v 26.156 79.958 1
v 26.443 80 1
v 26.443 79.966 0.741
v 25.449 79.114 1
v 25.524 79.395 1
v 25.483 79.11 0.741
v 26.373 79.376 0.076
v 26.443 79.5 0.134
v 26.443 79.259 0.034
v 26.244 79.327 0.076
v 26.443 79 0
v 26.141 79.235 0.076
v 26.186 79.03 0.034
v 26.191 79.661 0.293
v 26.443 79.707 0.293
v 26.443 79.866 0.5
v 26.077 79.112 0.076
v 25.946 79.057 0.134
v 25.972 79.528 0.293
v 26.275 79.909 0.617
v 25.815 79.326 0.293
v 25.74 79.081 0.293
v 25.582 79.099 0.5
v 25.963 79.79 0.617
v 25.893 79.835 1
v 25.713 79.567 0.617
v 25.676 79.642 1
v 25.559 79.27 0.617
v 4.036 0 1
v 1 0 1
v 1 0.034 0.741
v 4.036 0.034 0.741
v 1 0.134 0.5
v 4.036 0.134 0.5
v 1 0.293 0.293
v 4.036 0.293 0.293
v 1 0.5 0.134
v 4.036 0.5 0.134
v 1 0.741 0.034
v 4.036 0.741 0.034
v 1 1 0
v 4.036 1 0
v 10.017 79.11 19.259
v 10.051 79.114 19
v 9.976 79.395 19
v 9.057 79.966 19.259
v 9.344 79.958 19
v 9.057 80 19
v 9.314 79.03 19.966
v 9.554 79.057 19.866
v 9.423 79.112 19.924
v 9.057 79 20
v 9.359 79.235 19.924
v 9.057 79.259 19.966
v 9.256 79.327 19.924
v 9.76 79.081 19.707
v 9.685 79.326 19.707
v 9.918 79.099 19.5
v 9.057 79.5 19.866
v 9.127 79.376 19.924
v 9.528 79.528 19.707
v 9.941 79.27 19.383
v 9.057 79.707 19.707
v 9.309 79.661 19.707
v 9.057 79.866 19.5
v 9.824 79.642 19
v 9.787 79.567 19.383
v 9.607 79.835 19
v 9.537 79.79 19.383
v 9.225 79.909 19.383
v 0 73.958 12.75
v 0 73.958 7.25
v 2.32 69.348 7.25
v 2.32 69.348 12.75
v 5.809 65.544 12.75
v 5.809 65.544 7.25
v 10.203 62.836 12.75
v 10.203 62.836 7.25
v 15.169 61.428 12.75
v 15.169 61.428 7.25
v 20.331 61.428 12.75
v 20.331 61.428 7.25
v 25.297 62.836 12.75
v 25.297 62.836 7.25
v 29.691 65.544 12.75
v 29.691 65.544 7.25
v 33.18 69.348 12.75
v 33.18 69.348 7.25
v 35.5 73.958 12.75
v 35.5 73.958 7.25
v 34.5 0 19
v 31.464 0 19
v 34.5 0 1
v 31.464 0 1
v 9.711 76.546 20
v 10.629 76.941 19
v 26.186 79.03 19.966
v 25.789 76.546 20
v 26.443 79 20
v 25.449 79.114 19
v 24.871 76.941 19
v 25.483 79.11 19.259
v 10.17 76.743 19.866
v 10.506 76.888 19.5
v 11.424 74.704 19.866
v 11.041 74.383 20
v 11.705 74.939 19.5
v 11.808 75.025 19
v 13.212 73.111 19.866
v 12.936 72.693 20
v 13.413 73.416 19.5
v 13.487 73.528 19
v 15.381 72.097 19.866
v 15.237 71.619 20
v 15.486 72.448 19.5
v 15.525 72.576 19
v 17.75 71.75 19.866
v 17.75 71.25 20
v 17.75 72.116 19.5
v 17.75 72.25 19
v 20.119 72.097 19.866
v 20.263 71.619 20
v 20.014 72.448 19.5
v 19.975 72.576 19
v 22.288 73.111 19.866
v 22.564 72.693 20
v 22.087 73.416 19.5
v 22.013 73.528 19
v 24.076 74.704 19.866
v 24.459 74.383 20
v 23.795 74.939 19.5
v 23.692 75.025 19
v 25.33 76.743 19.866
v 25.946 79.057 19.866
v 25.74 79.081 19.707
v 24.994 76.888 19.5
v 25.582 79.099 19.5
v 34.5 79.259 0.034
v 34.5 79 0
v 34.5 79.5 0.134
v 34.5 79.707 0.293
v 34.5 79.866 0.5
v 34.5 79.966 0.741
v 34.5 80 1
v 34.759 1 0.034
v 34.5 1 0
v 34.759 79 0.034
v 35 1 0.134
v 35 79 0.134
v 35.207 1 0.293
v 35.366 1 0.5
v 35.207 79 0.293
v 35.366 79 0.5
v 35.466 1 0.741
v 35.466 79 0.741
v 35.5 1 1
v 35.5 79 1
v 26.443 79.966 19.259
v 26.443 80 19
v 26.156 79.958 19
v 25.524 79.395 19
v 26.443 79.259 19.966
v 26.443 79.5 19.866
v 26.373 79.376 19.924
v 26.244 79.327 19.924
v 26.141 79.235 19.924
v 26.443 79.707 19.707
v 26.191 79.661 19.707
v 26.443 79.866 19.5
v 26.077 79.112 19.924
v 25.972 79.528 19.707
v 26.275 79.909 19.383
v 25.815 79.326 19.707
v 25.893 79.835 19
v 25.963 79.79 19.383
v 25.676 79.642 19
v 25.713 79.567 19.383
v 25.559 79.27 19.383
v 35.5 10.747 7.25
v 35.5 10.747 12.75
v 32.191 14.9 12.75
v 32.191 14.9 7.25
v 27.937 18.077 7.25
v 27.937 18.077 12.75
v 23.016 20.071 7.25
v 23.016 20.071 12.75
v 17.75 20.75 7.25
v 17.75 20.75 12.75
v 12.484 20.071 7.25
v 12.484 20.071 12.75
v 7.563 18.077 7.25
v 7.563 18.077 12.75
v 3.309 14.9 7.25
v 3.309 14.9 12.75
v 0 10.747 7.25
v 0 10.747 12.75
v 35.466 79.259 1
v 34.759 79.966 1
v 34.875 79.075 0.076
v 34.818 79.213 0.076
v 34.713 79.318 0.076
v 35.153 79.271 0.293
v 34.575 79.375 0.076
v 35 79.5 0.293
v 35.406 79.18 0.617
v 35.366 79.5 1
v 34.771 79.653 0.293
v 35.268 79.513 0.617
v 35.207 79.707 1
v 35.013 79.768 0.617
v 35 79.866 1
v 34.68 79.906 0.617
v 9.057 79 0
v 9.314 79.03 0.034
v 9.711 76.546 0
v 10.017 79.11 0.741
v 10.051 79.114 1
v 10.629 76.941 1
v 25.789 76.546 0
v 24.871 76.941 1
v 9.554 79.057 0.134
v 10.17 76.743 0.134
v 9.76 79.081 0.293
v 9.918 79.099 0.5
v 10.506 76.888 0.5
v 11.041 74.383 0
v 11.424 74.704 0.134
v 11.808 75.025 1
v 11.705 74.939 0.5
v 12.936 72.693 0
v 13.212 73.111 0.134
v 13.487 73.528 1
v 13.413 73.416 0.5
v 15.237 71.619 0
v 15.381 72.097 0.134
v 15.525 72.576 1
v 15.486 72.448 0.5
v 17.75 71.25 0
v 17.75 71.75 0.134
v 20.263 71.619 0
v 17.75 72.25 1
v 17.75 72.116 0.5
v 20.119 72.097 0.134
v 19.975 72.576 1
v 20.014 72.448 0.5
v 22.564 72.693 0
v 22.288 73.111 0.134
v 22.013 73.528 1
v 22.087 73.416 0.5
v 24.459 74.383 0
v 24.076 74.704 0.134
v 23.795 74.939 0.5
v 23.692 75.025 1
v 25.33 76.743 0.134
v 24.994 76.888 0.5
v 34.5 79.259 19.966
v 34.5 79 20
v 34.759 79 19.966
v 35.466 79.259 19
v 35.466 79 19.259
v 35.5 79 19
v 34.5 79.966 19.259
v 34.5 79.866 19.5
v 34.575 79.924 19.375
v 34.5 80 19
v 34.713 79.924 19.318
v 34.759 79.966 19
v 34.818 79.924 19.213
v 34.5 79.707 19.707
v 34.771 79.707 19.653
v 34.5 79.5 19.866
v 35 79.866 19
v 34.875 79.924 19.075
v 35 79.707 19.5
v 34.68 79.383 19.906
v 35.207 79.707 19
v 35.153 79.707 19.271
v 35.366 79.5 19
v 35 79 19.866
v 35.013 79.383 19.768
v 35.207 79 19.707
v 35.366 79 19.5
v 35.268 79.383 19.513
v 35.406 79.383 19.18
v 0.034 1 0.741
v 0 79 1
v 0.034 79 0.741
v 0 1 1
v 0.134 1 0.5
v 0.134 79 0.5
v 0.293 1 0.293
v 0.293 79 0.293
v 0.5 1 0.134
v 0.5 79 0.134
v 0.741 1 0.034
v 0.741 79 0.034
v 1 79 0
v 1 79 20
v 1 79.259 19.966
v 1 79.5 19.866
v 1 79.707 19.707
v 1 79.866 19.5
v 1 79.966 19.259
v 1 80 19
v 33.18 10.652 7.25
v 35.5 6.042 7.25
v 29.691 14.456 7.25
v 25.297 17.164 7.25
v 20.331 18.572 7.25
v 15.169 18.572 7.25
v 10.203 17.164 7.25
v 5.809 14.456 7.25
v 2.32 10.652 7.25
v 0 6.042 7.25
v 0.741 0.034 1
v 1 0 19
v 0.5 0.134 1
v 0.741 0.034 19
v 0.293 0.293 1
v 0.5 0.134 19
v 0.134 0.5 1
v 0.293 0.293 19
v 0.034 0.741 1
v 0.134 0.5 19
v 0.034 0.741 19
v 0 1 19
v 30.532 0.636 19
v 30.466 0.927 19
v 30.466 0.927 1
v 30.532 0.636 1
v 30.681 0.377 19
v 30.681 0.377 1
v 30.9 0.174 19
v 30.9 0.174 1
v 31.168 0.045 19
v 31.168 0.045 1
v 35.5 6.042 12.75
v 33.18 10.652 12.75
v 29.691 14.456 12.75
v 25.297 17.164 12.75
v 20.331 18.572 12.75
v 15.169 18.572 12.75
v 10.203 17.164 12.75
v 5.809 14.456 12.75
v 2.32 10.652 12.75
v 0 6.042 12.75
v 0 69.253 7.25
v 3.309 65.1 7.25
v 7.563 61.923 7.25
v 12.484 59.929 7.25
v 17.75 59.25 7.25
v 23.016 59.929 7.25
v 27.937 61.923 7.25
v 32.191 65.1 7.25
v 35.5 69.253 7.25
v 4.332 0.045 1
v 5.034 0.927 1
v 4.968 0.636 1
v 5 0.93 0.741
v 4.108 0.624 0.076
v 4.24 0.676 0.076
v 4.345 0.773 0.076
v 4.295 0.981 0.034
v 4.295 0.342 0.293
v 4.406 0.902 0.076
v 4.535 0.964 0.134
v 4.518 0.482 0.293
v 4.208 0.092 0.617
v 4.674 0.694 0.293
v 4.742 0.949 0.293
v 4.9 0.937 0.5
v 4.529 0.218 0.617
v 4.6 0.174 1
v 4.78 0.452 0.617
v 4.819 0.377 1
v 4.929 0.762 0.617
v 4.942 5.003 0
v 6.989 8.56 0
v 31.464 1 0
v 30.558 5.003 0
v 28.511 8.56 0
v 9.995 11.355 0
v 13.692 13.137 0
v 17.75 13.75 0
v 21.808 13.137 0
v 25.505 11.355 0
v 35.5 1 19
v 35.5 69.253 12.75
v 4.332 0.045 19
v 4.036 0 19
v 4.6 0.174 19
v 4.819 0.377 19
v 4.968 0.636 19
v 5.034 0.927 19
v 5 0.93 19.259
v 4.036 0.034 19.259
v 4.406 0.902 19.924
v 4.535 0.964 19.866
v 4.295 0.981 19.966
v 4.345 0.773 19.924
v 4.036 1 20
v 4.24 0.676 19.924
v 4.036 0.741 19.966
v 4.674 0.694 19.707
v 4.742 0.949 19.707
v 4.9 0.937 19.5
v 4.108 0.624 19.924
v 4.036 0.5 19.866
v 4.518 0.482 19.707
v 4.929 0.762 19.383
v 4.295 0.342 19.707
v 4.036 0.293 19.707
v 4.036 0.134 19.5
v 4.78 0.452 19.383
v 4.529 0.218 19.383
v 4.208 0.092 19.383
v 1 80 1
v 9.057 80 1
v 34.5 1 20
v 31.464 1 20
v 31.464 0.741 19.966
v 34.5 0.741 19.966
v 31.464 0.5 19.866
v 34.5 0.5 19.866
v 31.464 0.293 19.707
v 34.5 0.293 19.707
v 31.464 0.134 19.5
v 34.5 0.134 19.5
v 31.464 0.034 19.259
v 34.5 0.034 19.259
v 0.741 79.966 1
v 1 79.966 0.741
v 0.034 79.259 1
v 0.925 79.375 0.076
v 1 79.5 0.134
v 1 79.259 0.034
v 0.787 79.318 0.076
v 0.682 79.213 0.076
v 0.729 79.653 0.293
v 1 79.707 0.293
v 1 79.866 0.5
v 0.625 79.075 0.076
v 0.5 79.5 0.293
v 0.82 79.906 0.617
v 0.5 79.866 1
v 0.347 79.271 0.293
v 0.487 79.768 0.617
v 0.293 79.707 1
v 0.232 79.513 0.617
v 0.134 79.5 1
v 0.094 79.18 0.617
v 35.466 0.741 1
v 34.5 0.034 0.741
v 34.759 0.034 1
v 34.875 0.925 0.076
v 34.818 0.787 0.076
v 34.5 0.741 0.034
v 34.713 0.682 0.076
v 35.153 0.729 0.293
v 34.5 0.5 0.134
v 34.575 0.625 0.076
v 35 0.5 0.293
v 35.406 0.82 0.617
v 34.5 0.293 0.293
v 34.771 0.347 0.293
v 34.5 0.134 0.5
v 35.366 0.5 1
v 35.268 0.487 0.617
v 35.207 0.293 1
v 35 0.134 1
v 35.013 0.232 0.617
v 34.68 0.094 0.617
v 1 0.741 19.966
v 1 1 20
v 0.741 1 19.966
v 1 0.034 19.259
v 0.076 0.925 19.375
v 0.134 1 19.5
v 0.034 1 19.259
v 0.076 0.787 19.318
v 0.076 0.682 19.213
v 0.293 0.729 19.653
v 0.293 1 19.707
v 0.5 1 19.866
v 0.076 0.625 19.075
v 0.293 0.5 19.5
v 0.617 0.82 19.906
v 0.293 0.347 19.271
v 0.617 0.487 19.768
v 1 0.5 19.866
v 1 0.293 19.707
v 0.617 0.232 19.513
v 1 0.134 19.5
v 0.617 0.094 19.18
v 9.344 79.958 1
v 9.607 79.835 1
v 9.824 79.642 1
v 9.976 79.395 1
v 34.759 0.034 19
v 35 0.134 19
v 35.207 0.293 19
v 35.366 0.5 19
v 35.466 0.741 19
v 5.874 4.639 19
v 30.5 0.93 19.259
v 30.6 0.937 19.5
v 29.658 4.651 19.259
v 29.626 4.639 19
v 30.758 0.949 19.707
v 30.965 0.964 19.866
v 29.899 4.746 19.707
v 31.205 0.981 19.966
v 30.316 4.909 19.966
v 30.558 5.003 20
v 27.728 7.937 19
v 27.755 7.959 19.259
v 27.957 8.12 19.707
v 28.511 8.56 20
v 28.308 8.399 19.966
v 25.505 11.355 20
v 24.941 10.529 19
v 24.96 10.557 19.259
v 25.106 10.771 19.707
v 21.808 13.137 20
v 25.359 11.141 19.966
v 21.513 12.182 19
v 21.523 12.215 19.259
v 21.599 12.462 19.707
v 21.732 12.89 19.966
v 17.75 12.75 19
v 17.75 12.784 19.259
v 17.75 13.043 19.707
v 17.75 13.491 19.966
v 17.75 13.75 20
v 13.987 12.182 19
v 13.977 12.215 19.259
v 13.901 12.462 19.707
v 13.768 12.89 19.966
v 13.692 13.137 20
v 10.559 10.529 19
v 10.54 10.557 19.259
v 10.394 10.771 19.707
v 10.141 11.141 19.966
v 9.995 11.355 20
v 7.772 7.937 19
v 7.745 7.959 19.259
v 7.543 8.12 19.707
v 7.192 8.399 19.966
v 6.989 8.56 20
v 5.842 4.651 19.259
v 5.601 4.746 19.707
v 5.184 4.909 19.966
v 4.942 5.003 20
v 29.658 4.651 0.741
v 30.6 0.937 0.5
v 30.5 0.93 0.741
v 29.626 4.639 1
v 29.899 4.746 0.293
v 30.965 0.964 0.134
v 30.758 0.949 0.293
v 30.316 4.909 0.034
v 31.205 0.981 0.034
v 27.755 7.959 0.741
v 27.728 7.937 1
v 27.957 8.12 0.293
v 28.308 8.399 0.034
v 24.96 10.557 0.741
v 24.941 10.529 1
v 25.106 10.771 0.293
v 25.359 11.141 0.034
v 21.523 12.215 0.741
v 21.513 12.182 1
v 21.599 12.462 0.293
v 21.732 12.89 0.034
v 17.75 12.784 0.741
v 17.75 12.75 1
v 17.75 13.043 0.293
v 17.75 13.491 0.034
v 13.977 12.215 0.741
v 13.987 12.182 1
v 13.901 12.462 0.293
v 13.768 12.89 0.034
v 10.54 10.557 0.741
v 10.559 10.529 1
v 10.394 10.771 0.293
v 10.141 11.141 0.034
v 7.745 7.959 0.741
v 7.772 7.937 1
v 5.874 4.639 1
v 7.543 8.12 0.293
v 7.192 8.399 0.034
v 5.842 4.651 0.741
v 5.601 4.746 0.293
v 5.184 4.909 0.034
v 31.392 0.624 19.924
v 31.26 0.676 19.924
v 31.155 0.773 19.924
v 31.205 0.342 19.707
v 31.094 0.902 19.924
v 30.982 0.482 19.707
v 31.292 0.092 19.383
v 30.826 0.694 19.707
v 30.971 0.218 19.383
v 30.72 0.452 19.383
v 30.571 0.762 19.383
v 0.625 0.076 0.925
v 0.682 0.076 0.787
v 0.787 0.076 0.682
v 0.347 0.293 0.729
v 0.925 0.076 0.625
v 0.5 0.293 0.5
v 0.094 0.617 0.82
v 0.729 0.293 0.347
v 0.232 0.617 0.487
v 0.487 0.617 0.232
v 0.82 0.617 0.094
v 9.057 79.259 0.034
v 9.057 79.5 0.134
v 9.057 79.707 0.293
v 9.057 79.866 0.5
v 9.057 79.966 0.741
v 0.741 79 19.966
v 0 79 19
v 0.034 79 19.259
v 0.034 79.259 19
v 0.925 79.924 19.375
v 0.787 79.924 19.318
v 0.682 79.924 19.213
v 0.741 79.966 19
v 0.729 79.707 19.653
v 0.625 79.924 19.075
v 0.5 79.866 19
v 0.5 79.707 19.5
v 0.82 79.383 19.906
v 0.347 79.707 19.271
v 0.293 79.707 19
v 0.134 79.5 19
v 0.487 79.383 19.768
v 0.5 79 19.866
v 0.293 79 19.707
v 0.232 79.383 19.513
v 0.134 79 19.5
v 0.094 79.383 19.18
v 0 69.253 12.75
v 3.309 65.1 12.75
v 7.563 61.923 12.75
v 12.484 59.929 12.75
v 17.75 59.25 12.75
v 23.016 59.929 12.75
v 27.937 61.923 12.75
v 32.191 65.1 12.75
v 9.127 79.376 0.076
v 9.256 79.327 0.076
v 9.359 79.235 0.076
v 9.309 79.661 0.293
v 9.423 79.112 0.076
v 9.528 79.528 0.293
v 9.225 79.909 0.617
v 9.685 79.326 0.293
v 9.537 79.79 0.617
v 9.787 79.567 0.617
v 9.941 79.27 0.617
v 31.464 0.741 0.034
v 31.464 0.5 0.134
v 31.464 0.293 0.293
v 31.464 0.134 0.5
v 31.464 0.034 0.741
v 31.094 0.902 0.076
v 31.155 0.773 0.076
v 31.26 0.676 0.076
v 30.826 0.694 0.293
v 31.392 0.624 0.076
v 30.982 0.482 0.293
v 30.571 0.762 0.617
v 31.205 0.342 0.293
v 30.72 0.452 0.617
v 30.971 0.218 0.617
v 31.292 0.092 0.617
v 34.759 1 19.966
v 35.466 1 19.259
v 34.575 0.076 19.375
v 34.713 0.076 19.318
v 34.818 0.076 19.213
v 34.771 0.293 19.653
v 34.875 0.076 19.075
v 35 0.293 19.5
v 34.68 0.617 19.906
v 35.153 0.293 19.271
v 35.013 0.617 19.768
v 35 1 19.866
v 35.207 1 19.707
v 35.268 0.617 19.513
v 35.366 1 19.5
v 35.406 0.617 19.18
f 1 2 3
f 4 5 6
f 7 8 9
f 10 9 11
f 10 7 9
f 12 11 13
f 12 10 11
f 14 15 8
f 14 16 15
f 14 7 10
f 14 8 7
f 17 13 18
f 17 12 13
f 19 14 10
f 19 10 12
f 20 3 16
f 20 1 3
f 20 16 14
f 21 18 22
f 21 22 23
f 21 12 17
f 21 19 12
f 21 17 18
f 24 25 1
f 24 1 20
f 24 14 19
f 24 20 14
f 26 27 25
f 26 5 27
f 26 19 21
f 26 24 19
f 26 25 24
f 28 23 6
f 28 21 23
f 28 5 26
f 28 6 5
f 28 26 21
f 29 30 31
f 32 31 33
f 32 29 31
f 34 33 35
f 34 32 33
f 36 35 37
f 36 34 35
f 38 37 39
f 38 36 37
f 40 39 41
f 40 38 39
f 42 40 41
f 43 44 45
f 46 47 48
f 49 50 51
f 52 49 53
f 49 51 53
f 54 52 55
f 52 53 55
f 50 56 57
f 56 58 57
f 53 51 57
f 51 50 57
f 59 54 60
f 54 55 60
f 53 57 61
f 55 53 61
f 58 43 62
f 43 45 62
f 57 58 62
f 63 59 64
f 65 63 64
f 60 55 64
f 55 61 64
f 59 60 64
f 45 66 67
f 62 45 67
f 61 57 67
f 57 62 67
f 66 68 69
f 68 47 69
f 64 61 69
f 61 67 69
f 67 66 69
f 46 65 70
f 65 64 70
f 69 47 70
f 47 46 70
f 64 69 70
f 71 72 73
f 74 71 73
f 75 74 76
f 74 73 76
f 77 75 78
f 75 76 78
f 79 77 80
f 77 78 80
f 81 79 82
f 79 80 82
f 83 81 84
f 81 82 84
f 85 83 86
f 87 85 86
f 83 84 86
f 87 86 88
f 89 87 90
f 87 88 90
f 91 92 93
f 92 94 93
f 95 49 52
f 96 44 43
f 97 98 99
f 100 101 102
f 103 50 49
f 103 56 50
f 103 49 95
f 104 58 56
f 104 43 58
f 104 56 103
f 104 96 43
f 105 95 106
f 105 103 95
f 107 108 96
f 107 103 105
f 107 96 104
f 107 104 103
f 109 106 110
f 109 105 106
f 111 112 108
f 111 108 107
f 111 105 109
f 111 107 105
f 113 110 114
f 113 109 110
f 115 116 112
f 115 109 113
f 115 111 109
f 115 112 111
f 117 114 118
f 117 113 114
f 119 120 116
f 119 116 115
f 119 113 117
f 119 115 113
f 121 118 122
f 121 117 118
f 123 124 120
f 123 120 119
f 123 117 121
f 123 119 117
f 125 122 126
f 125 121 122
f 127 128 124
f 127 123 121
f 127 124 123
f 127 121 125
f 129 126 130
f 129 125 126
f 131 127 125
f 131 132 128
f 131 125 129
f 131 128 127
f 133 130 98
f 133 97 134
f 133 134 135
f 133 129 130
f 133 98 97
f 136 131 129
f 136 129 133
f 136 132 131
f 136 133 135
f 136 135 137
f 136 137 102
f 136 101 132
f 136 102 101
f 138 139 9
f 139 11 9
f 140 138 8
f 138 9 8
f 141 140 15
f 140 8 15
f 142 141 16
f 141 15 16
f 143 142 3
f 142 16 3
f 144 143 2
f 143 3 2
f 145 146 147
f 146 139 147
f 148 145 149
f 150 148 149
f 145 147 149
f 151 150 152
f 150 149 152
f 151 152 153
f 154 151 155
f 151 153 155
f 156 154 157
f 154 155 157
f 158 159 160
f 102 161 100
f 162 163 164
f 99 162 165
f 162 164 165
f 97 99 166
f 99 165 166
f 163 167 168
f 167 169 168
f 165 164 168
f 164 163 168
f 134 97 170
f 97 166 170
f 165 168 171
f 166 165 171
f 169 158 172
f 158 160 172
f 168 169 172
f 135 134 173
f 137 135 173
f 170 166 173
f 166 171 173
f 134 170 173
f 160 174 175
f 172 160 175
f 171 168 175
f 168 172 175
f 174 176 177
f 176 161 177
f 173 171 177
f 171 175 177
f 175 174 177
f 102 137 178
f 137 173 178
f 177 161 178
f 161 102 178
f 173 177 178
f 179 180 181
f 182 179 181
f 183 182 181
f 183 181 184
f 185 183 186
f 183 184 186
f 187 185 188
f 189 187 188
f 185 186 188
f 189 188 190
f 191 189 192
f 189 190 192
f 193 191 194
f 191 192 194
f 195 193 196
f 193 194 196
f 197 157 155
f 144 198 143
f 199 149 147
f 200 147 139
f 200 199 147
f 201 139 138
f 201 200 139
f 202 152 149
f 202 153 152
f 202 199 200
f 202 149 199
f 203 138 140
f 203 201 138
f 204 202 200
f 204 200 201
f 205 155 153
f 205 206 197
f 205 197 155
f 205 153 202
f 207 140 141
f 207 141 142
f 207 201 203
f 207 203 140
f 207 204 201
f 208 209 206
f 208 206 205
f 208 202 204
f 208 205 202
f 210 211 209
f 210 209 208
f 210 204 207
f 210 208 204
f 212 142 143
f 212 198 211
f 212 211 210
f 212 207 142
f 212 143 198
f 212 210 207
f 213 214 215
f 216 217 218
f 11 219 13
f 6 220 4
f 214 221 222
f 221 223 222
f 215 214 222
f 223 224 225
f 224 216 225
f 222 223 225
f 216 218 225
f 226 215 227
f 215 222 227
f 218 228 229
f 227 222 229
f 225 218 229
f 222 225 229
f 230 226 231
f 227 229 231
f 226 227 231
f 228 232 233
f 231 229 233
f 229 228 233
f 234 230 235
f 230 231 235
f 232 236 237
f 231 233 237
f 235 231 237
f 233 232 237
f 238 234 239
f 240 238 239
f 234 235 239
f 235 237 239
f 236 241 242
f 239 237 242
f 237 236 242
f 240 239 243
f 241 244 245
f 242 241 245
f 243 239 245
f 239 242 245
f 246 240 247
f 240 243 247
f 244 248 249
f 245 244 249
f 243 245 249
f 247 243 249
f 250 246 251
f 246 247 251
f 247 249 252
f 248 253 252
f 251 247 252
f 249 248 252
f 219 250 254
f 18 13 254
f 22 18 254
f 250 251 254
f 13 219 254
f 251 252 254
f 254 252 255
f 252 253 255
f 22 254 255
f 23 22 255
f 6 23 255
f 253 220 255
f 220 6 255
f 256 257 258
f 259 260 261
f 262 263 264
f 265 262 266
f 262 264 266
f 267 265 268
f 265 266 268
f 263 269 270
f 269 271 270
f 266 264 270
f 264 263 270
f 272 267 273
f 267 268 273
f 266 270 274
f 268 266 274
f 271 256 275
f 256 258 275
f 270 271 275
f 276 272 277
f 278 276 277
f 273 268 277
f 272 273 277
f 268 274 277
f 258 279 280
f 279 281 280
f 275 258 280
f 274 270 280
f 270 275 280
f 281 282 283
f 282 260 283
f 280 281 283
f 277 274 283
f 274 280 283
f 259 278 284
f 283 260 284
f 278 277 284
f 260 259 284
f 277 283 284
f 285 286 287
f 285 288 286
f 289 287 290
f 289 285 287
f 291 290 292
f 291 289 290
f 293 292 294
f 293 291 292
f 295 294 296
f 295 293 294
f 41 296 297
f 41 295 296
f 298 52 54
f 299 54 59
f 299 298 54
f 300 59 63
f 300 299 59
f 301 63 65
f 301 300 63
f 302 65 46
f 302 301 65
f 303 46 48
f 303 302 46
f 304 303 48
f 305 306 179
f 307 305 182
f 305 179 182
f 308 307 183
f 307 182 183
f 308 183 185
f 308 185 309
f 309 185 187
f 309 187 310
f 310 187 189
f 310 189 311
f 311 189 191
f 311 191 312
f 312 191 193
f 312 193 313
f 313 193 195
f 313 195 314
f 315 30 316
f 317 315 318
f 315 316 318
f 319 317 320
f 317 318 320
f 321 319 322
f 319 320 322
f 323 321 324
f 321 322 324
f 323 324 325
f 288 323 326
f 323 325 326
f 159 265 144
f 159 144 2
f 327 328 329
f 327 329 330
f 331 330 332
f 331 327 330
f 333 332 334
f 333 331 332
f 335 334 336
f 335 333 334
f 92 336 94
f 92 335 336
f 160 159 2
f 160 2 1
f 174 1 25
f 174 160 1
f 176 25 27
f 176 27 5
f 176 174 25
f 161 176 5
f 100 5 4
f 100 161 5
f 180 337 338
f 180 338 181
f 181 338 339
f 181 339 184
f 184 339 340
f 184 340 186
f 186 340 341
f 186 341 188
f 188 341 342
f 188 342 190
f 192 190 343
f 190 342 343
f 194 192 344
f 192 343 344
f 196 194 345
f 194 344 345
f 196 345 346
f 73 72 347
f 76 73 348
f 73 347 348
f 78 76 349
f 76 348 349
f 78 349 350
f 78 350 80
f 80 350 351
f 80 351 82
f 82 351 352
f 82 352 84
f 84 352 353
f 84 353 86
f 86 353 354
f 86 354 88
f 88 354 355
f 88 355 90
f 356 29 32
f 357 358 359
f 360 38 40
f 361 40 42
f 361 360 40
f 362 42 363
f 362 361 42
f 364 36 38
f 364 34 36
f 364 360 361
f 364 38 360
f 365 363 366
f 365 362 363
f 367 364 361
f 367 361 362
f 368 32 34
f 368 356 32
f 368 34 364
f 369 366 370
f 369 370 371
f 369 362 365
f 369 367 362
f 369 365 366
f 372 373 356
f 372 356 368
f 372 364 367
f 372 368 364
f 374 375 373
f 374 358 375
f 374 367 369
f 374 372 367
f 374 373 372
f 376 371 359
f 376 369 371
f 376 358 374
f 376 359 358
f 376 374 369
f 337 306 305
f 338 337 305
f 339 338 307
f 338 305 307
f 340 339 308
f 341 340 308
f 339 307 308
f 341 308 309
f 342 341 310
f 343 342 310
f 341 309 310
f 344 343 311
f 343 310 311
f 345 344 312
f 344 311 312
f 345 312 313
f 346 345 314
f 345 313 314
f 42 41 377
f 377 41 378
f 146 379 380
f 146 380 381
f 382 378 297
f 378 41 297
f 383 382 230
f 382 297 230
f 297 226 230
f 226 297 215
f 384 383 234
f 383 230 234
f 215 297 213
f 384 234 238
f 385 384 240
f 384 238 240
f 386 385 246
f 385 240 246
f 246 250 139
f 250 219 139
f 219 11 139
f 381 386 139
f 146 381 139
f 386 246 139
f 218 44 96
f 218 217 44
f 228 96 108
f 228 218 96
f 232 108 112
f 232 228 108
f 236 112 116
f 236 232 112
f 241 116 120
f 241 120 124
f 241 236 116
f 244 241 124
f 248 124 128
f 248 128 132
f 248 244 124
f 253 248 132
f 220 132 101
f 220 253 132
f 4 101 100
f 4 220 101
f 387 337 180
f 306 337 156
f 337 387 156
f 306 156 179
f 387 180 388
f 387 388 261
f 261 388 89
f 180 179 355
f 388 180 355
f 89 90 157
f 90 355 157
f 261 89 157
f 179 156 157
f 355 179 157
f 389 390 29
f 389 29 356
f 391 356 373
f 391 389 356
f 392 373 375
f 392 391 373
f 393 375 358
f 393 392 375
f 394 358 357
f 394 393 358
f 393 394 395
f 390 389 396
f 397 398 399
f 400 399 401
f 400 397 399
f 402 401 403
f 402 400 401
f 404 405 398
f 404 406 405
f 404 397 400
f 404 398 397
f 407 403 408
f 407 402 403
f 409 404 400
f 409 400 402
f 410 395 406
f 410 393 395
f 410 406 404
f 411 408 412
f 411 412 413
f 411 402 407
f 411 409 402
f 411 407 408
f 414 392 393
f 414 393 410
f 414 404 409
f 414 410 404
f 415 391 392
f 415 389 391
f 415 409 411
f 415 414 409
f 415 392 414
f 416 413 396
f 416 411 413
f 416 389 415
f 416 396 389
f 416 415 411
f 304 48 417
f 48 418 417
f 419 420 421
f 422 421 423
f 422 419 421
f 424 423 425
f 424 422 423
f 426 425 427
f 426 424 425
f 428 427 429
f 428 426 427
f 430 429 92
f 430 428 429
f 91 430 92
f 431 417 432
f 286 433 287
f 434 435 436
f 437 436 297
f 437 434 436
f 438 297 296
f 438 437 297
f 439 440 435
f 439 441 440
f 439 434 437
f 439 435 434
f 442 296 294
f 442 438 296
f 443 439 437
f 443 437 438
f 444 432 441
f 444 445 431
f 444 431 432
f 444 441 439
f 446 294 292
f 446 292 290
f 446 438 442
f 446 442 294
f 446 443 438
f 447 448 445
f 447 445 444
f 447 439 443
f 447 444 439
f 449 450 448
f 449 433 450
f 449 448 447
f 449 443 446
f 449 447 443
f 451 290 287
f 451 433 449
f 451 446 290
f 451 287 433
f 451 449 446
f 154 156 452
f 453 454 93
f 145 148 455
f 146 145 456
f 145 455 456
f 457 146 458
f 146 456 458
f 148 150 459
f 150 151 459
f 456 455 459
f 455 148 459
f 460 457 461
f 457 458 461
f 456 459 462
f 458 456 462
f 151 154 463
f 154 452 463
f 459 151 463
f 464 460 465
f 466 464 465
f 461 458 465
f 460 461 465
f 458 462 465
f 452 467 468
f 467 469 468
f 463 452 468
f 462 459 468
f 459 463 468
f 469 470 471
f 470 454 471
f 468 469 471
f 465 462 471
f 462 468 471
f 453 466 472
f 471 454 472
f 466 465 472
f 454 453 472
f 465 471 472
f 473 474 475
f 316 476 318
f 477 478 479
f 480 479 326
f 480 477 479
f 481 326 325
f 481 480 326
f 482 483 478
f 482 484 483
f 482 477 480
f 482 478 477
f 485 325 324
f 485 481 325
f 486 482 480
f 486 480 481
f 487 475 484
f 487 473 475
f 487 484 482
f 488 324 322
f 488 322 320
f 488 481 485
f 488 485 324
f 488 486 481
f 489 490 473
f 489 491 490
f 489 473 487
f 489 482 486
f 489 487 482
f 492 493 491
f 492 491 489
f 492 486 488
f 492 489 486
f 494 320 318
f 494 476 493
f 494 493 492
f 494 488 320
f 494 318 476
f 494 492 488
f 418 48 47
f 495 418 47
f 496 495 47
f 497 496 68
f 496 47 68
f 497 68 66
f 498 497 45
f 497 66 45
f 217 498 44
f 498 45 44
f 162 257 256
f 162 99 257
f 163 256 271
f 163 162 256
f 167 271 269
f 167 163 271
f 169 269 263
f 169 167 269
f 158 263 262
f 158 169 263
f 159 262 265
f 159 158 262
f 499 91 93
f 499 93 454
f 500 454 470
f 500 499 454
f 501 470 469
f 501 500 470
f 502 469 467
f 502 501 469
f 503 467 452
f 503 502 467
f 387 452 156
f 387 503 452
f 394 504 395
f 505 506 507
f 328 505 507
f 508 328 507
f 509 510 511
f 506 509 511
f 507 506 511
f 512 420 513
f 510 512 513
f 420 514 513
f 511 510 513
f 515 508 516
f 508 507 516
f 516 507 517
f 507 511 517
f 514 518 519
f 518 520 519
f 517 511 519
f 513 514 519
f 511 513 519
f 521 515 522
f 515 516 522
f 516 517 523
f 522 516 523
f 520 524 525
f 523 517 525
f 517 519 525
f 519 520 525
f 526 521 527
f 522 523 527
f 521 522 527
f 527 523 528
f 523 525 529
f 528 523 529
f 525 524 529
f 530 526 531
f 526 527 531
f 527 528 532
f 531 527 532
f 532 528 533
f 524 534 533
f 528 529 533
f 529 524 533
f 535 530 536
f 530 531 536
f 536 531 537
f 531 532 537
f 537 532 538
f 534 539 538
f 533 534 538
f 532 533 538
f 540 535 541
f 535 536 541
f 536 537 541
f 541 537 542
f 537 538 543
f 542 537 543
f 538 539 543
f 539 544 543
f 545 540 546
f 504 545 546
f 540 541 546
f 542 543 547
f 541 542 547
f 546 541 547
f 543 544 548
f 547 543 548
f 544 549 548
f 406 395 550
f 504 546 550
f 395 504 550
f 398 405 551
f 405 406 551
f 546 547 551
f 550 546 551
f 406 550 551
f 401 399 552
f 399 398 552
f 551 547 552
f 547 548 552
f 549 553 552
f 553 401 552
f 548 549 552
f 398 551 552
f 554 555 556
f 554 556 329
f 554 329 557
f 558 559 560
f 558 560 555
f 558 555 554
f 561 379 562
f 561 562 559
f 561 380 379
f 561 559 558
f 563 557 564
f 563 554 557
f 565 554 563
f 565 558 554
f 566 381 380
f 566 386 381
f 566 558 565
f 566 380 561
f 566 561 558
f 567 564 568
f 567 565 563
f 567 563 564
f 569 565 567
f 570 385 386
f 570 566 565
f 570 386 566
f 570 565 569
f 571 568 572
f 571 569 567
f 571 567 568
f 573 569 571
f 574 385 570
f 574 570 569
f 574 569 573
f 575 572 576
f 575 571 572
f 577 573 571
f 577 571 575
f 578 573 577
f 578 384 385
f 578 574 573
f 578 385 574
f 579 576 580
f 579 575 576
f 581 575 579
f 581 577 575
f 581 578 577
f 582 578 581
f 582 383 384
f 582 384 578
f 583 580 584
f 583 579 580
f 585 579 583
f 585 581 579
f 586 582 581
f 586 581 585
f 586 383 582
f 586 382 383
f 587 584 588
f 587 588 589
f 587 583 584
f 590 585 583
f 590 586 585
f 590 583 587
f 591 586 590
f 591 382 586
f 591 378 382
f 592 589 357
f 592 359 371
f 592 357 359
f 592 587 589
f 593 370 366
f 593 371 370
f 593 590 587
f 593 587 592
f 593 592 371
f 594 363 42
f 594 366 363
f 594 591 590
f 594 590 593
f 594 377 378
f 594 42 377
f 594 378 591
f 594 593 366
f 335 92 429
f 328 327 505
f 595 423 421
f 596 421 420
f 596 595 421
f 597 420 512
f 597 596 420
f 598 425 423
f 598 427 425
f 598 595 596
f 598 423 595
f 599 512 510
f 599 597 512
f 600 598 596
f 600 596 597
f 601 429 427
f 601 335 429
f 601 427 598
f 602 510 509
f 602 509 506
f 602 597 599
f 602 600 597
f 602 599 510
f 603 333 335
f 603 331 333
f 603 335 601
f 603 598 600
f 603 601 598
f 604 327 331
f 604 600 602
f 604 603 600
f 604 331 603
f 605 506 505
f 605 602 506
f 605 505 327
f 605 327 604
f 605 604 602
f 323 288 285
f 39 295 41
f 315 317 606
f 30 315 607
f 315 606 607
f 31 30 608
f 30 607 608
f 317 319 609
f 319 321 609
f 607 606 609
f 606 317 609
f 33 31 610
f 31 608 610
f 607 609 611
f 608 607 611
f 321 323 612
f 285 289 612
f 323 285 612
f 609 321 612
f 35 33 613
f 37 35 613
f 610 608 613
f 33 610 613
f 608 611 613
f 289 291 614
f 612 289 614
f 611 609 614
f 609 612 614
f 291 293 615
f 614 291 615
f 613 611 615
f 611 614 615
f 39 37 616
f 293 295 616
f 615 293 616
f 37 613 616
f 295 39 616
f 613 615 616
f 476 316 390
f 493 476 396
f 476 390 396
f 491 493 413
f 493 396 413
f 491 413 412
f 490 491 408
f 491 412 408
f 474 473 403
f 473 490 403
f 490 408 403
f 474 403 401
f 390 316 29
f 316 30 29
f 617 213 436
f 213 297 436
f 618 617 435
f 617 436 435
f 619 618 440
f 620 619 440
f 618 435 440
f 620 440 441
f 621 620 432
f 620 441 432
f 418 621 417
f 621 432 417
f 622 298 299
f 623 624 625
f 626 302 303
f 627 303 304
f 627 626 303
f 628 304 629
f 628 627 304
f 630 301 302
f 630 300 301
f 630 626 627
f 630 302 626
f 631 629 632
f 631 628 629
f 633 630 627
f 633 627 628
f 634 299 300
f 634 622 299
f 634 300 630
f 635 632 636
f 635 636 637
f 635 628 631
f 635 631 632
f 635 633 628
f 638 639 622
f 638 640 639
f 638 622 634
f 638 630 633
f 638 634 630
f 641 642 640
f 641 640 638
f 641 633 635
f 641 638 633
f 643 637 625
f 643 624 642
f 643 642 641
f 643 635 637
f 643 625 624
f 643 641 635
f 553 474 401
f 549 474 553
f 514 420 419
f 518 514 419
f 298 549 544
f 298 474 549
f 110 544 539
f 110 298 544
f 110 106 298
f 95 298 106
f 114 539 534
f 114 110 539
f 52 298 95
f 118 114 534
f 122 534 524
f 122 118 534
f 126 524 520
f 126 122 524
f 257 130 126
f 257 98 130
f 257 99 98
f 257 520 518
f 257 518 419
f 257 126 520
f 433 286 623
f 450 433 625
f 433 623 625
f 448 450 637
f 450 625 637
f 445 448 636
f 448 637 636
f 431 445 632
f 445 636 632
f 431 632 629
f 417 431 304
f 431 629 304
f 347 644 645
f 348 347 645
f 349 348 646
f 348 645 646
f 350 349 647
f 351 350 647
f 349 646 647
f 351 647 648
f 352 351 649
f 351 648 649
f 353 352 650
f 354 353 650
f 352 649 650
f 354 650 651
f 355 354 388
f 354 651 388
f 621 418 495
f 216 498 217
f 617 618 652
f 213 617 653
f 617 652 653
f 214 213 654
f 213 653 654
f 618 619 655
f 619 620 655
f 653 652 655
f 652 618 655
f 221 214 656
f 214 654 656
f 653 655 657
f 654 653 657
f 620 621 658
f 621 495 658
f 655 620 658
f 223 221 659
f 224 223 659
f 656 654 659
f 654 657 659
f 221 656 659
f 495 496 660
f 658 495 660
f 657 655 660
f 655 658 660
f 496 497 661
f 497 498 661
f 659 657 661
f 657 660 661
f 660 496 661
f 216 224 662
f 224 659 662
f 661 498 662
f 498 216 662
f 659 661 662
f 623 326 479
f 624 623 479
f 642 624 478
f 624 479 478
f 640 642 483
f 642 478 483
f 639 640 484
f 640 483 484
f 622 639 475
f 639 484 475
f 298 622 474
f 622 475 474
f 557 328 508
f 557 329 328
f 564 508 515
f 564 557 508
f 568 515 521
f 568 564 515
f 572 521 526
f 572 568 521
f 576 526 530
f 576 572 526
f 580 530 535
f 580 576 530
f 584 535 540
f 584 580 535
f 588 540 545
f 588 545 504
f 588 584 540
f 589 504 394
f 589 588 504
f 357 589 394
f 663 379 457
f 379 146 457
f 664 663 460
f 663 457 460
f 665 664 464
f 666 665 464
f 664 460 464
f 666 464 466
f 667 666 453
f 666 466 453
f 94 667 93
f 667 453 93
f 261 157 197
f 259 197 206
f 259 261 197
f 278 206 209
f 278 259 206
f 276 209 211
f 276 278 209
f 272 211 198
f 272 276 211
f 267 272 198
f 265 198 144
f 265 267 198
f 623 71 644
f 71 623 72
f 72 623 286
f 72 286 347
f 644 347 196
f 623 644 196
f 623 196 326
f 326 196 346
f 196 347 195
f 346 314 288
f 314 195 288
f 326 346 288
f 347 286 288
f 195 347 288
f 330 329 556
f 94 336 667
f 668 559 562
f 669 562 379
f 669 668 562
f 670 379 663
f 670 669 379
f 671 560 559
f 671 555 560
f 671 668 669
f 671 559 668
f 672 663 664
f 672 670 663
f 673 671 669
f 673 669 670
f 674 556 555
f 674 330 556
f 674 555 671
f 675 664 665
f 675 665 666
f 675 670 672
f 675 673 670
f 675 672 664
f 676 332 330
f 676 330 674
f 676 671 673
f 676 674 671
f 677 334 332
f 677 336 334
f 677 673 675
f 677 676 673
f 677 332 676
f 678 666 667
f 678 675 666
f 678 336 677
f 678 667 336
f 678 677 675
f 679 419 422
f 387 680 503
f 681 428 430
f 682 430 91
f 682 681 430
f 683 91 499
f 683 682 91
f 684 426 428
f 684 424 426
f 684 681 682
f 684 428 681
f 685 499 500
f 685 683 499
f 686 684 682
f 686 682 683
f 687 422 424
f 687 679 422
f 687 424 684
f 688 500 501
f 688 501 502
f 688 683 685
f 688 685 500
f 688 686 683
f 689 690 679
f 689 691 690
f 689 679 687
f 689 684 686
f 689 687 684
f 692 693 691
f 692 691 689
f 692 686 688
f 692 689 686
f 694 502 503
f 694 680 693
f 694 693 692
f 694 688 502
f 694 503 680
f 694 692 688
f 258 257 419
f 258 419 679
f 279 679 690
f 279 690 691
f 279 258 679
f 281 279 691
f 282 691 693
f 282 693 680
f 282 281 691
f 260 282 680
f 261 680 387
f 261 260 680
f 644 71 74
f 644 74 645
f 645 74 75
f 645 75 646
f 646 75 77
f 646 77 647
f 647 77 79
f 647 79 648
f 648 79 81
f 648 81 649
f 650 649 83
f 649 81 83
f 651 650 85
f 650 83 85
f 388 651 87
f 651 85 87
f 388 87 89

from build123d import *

# Parameters (mm, degrees)
PAD_DEPTH   = 20
SKETCH002_W = 2
SKETCH002_H = 5.5
SKETCH004_W = 2
SKETCH004_H = 5.5
FILLET_R    = 1


with BuildPart() as part:
    # Sketch → Pad (new body)
    with BuildSketch(Plane.XY):
        with BuildLine():
            Line((0, 0), (5, 0))
            ThreePointArc((30.5, 0), (17.75, 12.75), (5, 0))
            Line((30.5, 0), (35.5, 0))
            Line((35.5, 0), (35.5, 80))
            Line((35.5, 80), (25.5, 80))
            ThreePointArc((10, 80), (17.75, 72.25), (25.5, 80))
            Line((10, 80), (0, 80))
            Line((0, 80), (0, 0))
        make_face()
    extrude(amount=PAD_DEPTH)

    # SubtractivePipe: sweep along a path in Sketch001
    with BuildLine(Plane.XY.offset(10)) as subtractivepipe_path:
        CenterArc((17.75, 0), 20, 0, 360)
    # Sketch002 → SubtractivePipe (sweep, cut)
    with BuildSketch(Plane.XZ):
        with Locations((37.5, 10)):
            Rectangle(SKETCH002_W, SKETCH002_H)
    sweep(path=subtractivepipe_path.line, mode=Mode.SUBTRACT)

    # SubtractivePipe001: sweep along a path in Sketch003
    with BuildLine(Plane.XY.offset(10)) as subtractivepipe001_path:
        CenterArc((17.75, 80), 20, 0, 360)
    # Sketch004 → SubtractivePipe001 (sweep, cut)
    with BuildSketch(Plane.XZ.offset(-80)):
        with Locations((37.5, 10)):
            Rectangle(SKETCH004_W, SKETCH004_H)
    sweep(path=subtractivepipe001_path.line, mode=Mode.SUBTRACT)

    # Fillet
    fillet_edges = [part.edges().sort_by_distance(p)[0] for p in [
        (35.5, 40, 20),
        (33, 0, 20),
        (17.75, 12.75, 20),
        (2.5, 0, 20),
        (0, 40, 20),
        (30.5, 80, 20),
        (17.75, 72.25, 20),
        (5, 80, 20),
        (0, 80, 10),
        (35.5, 80, 10),
        (35.5, 0, 10),
        (35.5, 40, 0),
        (5, 80, 0),
        (30.5, 80, 0),
        (17.75, 72.25, 0),
        (25.5, 80, 10),
        (10, 80, 10),
        (0, 40, 0),
        (0, 0, 10),
        (2.5, 0, 0),
        (17.75, 12.75, 0),
        (33, 0, 0),
        (30.5, 0, 10),
        (5, 0, 10),
    ]]
    fillet(fillet_edges, radius=FILLET_R)


solid = part.part
